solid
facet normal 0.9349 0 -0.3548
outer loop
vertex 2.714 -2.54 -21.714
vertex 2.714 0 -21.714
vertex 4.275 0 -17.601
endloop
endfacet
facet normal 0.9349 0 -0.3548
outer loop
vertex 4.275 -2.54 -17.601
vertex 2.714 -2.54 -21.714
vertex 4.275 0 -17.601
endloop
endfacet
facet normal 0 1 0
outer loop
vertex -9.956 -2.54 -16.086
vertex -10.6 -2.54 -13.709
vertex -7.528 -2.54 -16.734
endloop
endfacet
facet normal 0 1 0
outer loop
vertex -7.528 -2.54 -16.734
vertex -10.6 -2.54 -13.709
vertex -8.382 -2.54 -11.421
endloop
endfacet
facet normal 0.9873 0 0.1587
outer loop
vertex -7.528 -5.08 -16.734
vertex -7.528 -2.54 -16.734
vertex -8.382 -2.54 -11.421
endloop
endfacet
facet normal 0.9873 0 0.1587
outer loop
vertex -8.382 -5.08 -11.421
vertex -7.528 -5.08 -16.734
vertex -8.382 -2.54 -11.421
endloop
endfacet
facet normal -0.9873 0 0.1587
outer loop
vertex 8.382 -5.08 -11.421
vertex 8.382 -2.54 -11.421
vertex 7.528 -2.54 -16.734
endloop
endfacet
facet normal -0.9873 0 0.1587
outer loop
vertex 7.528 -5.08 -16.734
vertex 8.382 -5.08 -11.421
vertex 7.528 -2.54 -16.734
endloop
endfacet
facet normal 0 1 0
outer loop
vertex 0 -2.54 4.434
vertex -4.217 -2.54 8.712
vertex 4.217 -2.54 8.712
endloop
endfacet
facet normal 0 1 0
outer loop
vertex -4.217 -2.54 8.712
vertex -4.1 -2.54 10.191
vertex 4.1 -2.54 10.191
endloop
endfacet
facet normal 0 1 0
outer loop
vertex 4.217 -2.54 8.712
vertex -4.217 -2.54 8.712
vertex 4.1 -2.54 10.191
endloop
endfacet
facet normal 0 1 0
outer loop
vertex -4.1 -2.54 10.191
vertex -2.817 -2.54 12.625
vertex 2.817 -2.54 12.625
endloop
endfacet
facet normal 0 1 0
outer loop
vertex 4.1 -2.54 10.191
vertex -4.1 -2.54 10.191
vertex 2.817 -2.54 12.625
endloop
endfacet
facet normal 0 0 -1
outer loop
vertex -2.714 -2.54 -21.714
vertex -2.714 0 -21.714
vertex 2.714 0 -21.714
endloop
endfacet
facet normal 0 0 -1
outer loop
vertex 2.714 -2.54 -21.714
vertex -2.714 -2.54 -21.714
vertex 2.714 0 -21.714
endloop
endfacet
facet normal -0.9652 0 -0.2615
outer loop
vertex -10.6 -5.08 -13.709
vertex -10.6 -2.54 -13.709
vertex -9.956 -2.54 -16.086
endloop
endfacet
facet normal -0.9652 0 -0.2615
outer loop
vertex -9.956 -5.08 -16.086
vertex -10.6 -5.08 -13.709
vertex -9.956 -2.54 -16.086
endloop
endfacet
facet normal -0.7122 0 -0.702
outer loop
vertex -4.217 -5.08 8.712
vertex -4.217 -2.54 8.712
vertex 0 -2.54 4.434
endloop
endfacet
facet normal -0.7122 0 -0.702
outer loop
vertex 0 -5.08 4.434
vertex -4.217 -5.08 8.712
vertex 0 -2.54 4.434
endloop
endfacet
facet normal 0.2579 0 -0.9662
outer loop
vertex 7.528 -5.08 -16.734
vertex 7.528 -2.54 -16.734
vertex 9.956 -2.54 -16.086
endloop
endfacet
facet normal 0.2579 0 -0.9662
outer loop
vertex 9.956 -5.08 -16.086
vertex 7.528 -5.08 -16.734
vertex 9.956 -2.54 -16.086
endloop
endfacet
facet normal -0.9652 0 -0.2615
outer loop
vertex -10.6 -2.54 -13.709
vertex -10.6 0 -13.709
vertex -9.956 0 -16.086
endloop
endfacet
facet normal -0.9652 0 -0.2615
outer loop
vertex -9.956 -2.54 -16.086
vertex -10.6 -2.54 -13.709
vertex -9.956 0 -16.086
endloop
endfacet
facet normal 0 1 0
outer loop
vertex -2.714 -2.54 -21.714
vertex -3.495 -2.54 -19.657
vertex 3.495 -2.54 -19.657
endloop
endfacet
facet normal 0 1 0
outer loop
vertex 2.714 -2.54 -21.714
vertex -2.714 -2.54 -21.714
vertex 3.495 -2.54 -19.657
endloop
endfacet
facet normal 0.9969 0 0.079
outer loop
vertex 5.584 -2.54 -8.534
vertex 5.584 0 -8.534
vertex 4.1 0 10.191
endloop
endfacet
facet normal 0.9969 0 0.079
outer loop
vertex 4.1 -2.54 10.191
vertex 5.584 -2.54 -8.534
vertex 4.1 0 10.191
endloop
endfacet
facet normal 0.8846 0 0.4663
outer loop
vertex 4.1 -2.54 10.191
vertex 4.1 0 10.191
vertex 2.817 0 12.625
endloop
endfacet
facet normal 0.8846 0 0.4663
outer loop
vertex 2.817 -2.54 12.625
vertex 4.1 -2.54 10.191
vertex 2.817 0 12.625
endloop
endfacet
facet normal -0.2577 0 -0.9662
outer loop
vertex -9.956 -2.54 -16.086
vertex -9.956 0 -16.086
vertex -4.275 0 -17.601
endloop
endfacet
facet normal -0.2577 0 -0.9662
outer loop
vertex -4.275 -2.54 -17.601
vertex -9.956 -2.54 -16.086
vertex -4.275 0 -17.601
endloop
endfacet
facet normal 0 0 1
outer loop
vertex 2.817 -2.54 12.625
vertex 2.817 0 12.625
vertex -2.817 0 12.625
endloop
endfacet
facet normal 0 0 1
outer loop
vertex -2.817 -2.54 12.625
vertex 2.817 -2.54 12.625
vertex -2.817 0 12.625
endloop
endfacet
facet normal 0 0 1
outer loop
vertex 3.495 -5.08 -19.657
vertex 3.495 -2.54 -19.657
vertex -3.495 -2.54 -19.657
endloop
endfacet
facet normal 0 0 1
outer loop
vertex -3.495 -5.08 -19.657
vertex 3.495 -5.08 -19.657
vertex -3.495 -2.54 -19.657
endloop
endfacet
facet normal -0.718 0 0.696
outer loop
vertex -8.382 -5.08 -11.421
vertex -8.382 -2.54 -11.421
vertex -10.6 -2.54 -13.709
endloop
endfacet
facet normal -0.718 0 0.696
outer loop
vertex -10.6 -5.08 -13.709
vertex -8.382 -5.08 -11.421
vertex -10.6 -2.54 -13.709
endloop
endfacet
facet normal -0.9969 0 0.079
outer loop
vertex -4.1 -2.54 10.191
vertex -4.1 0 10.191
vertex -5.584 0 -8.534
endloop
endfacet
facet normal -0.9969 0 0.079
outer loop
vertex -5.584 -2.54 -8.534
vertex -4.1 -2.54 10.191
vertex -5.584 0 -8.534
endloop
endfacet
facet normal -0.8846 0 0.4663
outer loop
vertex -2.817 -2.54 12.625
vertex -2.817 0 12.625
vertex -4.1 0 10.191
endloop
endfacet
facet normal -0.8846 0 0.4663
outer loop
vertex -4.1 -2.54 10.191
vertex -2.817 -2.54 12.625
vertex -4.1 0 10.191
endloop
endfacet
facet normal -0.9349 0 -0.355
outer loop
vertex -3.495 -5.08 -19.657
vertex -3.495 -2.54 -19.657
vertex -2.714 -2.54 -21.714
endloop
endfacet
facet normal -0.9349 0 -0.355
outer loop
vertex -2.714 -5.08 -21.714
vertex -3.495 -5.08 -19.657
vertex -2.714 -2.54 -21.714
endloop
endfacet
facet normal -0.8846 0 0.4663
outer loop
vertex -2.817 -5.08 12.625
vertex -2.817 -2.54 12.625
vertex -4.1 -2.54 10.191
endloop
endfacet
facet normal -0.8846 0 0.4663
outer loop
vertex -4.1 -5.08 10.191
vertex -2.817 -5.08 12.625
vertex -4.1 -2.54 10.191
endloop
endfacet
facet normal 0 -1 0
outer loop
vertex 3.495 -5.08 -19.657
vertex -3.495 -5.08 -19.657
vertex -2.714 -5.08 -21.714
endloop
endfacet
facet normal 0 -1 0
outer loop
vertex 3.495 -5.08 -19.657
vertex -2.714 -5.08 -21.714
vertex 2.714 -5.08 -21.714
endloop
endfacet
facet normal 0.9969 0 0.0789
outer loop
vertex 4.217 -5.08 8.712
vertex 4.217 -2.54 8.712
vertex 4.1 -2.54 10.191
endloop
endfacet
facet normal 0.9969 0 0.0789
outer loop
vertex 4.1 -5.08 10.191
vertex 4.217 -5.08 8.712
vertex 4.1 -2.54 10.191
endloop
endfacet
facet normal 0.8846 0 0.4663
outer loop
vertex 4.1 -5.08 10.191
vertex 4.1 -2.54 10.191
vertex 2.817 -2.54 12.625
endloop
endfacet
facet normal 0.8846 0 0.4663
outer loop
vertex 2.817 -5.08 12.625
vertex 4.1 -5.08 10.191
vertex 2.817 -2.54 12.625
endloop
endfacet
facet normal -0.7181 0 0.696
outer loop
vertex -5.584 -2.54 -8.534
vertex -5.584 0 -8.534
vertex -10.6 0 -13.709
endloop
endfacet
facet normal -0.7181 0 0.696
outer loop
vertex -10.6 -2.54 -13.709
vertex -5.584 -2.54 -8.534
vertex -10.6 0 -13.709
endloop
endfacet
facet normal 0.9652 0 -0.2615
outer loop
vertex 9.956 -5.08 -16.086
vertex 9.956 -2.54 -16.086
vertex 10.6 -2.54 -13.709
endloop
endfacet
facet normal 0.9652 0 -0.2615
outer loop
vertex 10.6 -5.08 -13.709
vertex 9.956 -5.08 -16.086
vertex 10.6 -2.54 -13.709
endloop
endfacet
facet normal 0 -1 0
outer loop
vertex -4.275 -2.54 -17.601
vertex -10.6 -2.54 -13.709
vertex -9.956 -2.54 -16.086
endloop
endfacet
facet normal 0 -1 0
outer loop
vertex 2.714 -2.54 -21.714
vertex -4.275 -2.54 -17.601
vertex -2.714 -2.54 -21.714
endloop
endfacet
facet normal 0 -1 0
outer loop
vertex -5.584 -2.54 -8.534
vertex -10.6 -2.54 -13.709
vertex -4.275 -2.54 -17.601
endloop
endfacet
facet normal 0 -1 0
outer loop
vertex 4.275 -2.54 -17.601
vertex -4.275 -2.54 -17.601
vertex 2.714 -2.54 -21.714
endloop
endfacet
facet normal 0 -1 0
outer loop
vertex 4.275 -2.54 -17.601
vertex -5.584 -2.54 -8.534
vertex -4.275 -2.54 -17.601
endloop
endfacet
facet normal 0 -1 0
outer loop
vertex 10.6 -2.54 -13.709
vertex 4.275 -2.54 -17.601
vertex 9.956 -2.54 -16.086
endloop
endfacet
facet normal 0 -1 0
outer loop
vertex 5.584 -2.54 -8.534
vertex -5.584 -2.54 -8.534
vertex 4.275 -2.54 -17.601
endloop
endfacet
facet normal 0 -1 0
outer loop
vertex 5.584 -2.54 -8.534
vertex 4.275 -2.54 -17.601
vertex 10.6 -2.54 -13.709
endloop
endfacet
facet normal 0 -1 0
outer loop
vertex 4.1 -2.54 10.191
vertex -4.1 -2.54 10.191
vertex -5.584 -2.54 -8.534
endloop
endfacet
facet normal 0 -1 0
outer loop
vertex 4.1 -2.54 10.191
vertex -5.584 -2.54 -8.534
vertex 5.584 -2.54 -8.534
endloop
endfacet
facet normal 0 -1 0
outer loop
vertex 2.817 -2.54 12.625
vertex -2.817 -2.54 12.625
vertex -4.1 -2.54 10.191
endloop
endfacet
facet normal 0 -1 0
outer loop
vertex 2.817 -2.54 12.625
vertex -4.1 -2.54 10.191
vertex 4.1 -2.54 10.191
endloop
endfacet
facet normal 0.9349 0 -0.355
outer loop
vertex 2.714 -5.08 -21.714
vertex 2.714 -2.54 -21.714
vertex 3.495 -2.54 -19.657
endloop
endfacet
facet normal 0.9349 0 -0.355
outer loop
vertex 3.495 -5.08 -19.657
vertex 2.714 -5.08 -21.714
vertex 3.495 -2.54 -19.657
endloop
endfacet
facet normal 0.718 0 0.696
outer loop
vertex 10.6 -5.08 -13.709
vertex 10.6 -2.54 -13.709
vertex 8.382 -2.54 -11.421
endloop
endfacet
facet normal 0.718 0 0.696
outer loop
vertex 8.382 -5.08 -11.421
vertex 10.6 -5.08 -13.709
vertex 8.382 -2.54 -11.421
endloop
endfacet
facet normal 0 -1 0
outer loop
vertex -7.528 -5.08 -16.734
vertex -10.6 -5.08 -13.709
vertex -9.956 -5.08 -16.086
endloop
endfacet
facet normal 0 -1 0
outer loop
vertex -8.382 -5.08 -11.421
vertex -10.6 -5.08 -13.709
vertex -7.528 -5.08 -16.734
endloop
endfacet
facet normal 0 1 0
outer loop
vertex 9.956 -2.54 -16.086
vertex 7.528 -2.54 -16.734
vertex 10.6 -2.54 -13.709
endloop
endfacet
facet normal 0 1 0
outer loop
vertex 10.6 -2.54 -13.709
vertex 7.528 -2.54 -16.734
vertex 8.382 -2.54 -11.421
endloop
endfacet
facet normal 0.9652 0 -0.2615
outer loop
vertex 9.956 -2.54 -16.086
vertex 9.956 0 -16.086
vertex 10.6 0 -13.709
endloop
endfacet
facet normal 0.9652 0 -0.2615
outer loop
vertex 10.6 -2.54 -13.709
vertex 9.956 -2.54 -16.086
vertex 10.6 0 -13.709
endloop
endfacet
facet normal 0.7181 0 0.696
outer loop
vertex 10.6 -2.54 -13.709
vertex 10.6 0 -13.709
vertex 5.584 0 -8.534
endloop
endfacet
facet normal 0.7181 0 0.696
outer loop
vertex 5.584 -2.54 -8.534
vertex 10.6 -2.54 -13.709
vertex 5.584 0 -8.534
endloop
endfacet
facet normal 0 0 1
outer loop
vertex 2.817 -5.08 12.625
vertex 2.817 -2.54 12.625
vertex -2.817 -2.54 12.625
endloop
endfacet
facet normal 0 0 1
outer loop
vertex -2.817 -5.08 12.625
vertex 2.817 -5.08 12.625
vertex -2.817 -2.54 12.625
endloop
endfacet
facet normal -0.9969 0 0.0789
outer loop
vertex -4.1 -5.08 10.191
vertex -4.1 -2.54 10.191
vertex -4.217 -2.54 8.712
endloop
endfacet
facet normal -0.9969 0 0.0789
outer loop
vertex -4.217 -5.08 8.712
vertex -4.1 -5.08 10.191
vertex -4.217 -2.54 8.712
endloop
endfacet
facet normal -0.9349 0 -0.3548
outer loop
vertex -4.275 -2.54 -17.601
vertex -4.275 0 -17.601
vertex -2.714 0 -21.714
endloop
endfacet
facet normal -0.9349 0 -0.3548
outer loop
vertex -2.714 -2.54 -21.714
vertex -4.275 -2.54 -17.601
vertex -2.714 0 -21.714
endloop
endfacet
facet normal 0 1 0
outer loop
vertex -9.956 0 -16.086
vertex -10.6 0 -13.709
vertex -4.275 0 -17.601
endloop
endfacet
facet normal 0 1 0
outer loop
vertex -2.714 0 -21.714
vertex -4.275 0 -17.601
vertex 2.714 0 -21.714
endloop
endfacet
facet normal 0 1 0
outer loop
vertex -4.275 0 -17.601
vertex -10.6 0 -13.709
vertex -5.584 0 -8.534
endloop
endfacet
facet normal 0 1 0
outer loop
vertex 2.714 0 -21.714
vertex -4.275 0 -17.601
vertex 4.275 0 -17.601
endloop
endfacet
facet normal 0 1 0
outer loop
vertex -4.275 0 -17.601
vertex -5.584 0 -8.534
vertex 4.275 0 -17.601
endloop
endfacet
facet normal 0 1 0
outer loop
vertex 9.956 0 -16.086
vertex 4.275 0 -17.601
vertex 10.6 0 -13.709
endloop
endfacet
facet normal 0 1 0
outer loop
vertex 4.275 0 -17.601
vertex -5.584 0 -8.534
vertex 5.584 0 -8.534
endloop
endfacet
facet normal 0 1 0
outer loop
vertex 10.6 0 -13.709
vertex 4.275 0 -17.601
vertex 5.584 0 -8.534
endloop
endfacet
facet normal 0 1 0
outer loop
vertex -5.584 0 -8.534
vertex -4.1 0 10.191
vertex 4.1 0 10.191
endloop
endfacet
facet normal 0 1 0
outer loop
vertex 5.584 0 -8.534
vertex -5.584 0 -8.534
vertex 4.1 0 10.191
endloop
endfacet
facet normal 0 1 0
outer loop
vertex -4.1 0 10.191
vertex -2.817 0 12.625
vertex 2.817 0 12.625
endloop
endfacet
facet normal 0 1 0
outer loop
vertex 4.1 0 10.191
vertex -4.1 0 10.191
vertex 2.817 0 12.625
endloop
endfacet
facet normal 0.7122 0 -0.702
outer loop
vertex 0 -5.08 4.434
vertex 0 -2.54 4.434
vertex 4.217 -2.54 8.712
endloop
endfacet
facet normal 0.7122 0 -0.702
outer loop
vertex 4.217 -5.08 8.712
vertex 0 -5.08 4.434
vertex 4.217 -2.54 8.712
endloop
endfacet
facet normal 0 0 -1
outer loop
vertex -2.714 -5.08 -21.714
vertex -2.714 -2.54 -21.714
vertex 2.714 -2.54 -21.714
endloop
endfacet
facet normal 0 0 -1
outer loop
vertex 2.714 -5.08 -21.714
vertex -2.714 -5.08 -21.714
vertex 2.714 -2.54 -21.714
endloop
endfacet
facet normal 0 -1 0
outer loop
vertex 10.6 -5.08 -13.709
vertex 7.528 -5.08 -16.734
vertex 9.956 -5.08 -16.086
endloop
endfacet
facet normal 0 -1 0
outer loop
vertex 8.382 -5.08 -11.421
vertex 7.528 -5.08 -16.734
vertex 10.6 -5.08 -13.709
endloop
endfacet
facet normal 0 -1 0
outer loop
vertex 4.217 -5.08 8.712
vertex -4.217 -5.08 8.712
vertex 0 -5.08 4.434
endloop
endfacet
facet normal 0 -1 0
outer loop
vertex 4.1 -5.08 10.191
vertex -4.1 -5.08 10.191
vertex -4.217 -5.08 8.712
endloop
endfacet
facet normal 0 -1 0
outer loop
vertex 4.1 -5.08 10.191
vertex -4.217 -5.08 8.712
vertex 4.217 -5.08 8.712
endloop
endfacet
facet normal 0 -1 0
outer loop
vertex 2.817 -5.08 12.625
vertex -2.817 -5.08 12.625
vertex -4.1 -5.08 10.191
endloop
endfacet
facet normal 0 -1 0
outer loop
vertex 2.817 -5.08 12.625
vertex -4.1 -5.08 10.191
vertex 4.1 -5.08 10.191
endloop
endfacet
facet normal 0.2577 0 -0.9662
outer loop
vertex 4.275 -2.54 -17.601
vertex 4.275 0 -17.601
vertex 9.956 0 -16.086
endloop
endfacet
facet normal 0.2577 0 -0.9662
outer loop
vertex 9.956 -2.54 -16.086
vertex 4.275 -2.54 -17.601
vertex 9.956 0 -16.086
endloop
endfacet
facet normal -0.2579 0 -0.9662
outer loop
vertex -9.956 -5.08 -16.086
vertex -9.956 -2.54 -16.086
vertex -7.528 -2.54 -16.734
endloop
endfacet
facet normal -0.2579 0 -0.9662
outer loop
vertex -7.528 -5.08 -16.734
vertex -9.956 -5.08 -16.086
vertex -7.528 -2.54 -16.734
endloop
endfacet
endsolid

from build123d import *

# Parameters (mm, degrees)
F1_DEPTH = 2.54
F3_DEPTH = 2.54
F5_DEPTH = 2.54


with BuildPart() as f1:
    # F0 (on Front) → F1 (new body)
    with BuildSketch(Plane.XZ):
        Polygon((-4.275133, -17.600922), (-2.713893, -21.713564), (2.713893, -21.713564), (4.275133, -17.600922), (9.956317, -16.085941), (10.600286, -13.709481), (5.584135, -8.534087), (4.099877, 10.191229), (2.817419, 12.624688), (-2.817419, 12.624688), (-4.099877, 10.191229), (-5.584135, -8.534087), (-10.600286, -13.709481), (-9.956317, -16.085941), align=None)
    extrude(amount=F1_DEPTH)


with BuildPart() as f3:
    # F2 (on face) → F3 (new body)
    with BuildSketch(Plane.XZ.offset(2.54)):
        Polygon((4.099877, 10.191229), (2.817419, 12.624688), (-2.817419, 12.624688), (-4.099877, 10.191229), (-4.217101, 8.712332), (0, 4.434315), (4.217101, 8.712332), align=None)
    extrude(amount=F3_DEPTH)


with BuildPart() as f5:
    # F4 (on face) → F5 (new body)
    with BuildSketch(Plane.XZ.offset(2.54)):
        Polygon((-7.527774, -16.733552), (-8.381844, -11.420613), (-10.600286, -13.709481), (-9.956317, -16.085941), align=None)
        Polygon((7.527774, -16.733552), (9.956317, -16.085941), (10.600286, -13.709481), (8.381844, -11.420613), align=None)
        Polygon((-3.494513, -19.657243), (-2.713893, -21.713564), (2.713893, -21.713564), (3.494513, -19.657243), align=None)
    extrude(amount=F5_DEPTH)


solid = Compound([f1.part, f3.part, f5.part])
